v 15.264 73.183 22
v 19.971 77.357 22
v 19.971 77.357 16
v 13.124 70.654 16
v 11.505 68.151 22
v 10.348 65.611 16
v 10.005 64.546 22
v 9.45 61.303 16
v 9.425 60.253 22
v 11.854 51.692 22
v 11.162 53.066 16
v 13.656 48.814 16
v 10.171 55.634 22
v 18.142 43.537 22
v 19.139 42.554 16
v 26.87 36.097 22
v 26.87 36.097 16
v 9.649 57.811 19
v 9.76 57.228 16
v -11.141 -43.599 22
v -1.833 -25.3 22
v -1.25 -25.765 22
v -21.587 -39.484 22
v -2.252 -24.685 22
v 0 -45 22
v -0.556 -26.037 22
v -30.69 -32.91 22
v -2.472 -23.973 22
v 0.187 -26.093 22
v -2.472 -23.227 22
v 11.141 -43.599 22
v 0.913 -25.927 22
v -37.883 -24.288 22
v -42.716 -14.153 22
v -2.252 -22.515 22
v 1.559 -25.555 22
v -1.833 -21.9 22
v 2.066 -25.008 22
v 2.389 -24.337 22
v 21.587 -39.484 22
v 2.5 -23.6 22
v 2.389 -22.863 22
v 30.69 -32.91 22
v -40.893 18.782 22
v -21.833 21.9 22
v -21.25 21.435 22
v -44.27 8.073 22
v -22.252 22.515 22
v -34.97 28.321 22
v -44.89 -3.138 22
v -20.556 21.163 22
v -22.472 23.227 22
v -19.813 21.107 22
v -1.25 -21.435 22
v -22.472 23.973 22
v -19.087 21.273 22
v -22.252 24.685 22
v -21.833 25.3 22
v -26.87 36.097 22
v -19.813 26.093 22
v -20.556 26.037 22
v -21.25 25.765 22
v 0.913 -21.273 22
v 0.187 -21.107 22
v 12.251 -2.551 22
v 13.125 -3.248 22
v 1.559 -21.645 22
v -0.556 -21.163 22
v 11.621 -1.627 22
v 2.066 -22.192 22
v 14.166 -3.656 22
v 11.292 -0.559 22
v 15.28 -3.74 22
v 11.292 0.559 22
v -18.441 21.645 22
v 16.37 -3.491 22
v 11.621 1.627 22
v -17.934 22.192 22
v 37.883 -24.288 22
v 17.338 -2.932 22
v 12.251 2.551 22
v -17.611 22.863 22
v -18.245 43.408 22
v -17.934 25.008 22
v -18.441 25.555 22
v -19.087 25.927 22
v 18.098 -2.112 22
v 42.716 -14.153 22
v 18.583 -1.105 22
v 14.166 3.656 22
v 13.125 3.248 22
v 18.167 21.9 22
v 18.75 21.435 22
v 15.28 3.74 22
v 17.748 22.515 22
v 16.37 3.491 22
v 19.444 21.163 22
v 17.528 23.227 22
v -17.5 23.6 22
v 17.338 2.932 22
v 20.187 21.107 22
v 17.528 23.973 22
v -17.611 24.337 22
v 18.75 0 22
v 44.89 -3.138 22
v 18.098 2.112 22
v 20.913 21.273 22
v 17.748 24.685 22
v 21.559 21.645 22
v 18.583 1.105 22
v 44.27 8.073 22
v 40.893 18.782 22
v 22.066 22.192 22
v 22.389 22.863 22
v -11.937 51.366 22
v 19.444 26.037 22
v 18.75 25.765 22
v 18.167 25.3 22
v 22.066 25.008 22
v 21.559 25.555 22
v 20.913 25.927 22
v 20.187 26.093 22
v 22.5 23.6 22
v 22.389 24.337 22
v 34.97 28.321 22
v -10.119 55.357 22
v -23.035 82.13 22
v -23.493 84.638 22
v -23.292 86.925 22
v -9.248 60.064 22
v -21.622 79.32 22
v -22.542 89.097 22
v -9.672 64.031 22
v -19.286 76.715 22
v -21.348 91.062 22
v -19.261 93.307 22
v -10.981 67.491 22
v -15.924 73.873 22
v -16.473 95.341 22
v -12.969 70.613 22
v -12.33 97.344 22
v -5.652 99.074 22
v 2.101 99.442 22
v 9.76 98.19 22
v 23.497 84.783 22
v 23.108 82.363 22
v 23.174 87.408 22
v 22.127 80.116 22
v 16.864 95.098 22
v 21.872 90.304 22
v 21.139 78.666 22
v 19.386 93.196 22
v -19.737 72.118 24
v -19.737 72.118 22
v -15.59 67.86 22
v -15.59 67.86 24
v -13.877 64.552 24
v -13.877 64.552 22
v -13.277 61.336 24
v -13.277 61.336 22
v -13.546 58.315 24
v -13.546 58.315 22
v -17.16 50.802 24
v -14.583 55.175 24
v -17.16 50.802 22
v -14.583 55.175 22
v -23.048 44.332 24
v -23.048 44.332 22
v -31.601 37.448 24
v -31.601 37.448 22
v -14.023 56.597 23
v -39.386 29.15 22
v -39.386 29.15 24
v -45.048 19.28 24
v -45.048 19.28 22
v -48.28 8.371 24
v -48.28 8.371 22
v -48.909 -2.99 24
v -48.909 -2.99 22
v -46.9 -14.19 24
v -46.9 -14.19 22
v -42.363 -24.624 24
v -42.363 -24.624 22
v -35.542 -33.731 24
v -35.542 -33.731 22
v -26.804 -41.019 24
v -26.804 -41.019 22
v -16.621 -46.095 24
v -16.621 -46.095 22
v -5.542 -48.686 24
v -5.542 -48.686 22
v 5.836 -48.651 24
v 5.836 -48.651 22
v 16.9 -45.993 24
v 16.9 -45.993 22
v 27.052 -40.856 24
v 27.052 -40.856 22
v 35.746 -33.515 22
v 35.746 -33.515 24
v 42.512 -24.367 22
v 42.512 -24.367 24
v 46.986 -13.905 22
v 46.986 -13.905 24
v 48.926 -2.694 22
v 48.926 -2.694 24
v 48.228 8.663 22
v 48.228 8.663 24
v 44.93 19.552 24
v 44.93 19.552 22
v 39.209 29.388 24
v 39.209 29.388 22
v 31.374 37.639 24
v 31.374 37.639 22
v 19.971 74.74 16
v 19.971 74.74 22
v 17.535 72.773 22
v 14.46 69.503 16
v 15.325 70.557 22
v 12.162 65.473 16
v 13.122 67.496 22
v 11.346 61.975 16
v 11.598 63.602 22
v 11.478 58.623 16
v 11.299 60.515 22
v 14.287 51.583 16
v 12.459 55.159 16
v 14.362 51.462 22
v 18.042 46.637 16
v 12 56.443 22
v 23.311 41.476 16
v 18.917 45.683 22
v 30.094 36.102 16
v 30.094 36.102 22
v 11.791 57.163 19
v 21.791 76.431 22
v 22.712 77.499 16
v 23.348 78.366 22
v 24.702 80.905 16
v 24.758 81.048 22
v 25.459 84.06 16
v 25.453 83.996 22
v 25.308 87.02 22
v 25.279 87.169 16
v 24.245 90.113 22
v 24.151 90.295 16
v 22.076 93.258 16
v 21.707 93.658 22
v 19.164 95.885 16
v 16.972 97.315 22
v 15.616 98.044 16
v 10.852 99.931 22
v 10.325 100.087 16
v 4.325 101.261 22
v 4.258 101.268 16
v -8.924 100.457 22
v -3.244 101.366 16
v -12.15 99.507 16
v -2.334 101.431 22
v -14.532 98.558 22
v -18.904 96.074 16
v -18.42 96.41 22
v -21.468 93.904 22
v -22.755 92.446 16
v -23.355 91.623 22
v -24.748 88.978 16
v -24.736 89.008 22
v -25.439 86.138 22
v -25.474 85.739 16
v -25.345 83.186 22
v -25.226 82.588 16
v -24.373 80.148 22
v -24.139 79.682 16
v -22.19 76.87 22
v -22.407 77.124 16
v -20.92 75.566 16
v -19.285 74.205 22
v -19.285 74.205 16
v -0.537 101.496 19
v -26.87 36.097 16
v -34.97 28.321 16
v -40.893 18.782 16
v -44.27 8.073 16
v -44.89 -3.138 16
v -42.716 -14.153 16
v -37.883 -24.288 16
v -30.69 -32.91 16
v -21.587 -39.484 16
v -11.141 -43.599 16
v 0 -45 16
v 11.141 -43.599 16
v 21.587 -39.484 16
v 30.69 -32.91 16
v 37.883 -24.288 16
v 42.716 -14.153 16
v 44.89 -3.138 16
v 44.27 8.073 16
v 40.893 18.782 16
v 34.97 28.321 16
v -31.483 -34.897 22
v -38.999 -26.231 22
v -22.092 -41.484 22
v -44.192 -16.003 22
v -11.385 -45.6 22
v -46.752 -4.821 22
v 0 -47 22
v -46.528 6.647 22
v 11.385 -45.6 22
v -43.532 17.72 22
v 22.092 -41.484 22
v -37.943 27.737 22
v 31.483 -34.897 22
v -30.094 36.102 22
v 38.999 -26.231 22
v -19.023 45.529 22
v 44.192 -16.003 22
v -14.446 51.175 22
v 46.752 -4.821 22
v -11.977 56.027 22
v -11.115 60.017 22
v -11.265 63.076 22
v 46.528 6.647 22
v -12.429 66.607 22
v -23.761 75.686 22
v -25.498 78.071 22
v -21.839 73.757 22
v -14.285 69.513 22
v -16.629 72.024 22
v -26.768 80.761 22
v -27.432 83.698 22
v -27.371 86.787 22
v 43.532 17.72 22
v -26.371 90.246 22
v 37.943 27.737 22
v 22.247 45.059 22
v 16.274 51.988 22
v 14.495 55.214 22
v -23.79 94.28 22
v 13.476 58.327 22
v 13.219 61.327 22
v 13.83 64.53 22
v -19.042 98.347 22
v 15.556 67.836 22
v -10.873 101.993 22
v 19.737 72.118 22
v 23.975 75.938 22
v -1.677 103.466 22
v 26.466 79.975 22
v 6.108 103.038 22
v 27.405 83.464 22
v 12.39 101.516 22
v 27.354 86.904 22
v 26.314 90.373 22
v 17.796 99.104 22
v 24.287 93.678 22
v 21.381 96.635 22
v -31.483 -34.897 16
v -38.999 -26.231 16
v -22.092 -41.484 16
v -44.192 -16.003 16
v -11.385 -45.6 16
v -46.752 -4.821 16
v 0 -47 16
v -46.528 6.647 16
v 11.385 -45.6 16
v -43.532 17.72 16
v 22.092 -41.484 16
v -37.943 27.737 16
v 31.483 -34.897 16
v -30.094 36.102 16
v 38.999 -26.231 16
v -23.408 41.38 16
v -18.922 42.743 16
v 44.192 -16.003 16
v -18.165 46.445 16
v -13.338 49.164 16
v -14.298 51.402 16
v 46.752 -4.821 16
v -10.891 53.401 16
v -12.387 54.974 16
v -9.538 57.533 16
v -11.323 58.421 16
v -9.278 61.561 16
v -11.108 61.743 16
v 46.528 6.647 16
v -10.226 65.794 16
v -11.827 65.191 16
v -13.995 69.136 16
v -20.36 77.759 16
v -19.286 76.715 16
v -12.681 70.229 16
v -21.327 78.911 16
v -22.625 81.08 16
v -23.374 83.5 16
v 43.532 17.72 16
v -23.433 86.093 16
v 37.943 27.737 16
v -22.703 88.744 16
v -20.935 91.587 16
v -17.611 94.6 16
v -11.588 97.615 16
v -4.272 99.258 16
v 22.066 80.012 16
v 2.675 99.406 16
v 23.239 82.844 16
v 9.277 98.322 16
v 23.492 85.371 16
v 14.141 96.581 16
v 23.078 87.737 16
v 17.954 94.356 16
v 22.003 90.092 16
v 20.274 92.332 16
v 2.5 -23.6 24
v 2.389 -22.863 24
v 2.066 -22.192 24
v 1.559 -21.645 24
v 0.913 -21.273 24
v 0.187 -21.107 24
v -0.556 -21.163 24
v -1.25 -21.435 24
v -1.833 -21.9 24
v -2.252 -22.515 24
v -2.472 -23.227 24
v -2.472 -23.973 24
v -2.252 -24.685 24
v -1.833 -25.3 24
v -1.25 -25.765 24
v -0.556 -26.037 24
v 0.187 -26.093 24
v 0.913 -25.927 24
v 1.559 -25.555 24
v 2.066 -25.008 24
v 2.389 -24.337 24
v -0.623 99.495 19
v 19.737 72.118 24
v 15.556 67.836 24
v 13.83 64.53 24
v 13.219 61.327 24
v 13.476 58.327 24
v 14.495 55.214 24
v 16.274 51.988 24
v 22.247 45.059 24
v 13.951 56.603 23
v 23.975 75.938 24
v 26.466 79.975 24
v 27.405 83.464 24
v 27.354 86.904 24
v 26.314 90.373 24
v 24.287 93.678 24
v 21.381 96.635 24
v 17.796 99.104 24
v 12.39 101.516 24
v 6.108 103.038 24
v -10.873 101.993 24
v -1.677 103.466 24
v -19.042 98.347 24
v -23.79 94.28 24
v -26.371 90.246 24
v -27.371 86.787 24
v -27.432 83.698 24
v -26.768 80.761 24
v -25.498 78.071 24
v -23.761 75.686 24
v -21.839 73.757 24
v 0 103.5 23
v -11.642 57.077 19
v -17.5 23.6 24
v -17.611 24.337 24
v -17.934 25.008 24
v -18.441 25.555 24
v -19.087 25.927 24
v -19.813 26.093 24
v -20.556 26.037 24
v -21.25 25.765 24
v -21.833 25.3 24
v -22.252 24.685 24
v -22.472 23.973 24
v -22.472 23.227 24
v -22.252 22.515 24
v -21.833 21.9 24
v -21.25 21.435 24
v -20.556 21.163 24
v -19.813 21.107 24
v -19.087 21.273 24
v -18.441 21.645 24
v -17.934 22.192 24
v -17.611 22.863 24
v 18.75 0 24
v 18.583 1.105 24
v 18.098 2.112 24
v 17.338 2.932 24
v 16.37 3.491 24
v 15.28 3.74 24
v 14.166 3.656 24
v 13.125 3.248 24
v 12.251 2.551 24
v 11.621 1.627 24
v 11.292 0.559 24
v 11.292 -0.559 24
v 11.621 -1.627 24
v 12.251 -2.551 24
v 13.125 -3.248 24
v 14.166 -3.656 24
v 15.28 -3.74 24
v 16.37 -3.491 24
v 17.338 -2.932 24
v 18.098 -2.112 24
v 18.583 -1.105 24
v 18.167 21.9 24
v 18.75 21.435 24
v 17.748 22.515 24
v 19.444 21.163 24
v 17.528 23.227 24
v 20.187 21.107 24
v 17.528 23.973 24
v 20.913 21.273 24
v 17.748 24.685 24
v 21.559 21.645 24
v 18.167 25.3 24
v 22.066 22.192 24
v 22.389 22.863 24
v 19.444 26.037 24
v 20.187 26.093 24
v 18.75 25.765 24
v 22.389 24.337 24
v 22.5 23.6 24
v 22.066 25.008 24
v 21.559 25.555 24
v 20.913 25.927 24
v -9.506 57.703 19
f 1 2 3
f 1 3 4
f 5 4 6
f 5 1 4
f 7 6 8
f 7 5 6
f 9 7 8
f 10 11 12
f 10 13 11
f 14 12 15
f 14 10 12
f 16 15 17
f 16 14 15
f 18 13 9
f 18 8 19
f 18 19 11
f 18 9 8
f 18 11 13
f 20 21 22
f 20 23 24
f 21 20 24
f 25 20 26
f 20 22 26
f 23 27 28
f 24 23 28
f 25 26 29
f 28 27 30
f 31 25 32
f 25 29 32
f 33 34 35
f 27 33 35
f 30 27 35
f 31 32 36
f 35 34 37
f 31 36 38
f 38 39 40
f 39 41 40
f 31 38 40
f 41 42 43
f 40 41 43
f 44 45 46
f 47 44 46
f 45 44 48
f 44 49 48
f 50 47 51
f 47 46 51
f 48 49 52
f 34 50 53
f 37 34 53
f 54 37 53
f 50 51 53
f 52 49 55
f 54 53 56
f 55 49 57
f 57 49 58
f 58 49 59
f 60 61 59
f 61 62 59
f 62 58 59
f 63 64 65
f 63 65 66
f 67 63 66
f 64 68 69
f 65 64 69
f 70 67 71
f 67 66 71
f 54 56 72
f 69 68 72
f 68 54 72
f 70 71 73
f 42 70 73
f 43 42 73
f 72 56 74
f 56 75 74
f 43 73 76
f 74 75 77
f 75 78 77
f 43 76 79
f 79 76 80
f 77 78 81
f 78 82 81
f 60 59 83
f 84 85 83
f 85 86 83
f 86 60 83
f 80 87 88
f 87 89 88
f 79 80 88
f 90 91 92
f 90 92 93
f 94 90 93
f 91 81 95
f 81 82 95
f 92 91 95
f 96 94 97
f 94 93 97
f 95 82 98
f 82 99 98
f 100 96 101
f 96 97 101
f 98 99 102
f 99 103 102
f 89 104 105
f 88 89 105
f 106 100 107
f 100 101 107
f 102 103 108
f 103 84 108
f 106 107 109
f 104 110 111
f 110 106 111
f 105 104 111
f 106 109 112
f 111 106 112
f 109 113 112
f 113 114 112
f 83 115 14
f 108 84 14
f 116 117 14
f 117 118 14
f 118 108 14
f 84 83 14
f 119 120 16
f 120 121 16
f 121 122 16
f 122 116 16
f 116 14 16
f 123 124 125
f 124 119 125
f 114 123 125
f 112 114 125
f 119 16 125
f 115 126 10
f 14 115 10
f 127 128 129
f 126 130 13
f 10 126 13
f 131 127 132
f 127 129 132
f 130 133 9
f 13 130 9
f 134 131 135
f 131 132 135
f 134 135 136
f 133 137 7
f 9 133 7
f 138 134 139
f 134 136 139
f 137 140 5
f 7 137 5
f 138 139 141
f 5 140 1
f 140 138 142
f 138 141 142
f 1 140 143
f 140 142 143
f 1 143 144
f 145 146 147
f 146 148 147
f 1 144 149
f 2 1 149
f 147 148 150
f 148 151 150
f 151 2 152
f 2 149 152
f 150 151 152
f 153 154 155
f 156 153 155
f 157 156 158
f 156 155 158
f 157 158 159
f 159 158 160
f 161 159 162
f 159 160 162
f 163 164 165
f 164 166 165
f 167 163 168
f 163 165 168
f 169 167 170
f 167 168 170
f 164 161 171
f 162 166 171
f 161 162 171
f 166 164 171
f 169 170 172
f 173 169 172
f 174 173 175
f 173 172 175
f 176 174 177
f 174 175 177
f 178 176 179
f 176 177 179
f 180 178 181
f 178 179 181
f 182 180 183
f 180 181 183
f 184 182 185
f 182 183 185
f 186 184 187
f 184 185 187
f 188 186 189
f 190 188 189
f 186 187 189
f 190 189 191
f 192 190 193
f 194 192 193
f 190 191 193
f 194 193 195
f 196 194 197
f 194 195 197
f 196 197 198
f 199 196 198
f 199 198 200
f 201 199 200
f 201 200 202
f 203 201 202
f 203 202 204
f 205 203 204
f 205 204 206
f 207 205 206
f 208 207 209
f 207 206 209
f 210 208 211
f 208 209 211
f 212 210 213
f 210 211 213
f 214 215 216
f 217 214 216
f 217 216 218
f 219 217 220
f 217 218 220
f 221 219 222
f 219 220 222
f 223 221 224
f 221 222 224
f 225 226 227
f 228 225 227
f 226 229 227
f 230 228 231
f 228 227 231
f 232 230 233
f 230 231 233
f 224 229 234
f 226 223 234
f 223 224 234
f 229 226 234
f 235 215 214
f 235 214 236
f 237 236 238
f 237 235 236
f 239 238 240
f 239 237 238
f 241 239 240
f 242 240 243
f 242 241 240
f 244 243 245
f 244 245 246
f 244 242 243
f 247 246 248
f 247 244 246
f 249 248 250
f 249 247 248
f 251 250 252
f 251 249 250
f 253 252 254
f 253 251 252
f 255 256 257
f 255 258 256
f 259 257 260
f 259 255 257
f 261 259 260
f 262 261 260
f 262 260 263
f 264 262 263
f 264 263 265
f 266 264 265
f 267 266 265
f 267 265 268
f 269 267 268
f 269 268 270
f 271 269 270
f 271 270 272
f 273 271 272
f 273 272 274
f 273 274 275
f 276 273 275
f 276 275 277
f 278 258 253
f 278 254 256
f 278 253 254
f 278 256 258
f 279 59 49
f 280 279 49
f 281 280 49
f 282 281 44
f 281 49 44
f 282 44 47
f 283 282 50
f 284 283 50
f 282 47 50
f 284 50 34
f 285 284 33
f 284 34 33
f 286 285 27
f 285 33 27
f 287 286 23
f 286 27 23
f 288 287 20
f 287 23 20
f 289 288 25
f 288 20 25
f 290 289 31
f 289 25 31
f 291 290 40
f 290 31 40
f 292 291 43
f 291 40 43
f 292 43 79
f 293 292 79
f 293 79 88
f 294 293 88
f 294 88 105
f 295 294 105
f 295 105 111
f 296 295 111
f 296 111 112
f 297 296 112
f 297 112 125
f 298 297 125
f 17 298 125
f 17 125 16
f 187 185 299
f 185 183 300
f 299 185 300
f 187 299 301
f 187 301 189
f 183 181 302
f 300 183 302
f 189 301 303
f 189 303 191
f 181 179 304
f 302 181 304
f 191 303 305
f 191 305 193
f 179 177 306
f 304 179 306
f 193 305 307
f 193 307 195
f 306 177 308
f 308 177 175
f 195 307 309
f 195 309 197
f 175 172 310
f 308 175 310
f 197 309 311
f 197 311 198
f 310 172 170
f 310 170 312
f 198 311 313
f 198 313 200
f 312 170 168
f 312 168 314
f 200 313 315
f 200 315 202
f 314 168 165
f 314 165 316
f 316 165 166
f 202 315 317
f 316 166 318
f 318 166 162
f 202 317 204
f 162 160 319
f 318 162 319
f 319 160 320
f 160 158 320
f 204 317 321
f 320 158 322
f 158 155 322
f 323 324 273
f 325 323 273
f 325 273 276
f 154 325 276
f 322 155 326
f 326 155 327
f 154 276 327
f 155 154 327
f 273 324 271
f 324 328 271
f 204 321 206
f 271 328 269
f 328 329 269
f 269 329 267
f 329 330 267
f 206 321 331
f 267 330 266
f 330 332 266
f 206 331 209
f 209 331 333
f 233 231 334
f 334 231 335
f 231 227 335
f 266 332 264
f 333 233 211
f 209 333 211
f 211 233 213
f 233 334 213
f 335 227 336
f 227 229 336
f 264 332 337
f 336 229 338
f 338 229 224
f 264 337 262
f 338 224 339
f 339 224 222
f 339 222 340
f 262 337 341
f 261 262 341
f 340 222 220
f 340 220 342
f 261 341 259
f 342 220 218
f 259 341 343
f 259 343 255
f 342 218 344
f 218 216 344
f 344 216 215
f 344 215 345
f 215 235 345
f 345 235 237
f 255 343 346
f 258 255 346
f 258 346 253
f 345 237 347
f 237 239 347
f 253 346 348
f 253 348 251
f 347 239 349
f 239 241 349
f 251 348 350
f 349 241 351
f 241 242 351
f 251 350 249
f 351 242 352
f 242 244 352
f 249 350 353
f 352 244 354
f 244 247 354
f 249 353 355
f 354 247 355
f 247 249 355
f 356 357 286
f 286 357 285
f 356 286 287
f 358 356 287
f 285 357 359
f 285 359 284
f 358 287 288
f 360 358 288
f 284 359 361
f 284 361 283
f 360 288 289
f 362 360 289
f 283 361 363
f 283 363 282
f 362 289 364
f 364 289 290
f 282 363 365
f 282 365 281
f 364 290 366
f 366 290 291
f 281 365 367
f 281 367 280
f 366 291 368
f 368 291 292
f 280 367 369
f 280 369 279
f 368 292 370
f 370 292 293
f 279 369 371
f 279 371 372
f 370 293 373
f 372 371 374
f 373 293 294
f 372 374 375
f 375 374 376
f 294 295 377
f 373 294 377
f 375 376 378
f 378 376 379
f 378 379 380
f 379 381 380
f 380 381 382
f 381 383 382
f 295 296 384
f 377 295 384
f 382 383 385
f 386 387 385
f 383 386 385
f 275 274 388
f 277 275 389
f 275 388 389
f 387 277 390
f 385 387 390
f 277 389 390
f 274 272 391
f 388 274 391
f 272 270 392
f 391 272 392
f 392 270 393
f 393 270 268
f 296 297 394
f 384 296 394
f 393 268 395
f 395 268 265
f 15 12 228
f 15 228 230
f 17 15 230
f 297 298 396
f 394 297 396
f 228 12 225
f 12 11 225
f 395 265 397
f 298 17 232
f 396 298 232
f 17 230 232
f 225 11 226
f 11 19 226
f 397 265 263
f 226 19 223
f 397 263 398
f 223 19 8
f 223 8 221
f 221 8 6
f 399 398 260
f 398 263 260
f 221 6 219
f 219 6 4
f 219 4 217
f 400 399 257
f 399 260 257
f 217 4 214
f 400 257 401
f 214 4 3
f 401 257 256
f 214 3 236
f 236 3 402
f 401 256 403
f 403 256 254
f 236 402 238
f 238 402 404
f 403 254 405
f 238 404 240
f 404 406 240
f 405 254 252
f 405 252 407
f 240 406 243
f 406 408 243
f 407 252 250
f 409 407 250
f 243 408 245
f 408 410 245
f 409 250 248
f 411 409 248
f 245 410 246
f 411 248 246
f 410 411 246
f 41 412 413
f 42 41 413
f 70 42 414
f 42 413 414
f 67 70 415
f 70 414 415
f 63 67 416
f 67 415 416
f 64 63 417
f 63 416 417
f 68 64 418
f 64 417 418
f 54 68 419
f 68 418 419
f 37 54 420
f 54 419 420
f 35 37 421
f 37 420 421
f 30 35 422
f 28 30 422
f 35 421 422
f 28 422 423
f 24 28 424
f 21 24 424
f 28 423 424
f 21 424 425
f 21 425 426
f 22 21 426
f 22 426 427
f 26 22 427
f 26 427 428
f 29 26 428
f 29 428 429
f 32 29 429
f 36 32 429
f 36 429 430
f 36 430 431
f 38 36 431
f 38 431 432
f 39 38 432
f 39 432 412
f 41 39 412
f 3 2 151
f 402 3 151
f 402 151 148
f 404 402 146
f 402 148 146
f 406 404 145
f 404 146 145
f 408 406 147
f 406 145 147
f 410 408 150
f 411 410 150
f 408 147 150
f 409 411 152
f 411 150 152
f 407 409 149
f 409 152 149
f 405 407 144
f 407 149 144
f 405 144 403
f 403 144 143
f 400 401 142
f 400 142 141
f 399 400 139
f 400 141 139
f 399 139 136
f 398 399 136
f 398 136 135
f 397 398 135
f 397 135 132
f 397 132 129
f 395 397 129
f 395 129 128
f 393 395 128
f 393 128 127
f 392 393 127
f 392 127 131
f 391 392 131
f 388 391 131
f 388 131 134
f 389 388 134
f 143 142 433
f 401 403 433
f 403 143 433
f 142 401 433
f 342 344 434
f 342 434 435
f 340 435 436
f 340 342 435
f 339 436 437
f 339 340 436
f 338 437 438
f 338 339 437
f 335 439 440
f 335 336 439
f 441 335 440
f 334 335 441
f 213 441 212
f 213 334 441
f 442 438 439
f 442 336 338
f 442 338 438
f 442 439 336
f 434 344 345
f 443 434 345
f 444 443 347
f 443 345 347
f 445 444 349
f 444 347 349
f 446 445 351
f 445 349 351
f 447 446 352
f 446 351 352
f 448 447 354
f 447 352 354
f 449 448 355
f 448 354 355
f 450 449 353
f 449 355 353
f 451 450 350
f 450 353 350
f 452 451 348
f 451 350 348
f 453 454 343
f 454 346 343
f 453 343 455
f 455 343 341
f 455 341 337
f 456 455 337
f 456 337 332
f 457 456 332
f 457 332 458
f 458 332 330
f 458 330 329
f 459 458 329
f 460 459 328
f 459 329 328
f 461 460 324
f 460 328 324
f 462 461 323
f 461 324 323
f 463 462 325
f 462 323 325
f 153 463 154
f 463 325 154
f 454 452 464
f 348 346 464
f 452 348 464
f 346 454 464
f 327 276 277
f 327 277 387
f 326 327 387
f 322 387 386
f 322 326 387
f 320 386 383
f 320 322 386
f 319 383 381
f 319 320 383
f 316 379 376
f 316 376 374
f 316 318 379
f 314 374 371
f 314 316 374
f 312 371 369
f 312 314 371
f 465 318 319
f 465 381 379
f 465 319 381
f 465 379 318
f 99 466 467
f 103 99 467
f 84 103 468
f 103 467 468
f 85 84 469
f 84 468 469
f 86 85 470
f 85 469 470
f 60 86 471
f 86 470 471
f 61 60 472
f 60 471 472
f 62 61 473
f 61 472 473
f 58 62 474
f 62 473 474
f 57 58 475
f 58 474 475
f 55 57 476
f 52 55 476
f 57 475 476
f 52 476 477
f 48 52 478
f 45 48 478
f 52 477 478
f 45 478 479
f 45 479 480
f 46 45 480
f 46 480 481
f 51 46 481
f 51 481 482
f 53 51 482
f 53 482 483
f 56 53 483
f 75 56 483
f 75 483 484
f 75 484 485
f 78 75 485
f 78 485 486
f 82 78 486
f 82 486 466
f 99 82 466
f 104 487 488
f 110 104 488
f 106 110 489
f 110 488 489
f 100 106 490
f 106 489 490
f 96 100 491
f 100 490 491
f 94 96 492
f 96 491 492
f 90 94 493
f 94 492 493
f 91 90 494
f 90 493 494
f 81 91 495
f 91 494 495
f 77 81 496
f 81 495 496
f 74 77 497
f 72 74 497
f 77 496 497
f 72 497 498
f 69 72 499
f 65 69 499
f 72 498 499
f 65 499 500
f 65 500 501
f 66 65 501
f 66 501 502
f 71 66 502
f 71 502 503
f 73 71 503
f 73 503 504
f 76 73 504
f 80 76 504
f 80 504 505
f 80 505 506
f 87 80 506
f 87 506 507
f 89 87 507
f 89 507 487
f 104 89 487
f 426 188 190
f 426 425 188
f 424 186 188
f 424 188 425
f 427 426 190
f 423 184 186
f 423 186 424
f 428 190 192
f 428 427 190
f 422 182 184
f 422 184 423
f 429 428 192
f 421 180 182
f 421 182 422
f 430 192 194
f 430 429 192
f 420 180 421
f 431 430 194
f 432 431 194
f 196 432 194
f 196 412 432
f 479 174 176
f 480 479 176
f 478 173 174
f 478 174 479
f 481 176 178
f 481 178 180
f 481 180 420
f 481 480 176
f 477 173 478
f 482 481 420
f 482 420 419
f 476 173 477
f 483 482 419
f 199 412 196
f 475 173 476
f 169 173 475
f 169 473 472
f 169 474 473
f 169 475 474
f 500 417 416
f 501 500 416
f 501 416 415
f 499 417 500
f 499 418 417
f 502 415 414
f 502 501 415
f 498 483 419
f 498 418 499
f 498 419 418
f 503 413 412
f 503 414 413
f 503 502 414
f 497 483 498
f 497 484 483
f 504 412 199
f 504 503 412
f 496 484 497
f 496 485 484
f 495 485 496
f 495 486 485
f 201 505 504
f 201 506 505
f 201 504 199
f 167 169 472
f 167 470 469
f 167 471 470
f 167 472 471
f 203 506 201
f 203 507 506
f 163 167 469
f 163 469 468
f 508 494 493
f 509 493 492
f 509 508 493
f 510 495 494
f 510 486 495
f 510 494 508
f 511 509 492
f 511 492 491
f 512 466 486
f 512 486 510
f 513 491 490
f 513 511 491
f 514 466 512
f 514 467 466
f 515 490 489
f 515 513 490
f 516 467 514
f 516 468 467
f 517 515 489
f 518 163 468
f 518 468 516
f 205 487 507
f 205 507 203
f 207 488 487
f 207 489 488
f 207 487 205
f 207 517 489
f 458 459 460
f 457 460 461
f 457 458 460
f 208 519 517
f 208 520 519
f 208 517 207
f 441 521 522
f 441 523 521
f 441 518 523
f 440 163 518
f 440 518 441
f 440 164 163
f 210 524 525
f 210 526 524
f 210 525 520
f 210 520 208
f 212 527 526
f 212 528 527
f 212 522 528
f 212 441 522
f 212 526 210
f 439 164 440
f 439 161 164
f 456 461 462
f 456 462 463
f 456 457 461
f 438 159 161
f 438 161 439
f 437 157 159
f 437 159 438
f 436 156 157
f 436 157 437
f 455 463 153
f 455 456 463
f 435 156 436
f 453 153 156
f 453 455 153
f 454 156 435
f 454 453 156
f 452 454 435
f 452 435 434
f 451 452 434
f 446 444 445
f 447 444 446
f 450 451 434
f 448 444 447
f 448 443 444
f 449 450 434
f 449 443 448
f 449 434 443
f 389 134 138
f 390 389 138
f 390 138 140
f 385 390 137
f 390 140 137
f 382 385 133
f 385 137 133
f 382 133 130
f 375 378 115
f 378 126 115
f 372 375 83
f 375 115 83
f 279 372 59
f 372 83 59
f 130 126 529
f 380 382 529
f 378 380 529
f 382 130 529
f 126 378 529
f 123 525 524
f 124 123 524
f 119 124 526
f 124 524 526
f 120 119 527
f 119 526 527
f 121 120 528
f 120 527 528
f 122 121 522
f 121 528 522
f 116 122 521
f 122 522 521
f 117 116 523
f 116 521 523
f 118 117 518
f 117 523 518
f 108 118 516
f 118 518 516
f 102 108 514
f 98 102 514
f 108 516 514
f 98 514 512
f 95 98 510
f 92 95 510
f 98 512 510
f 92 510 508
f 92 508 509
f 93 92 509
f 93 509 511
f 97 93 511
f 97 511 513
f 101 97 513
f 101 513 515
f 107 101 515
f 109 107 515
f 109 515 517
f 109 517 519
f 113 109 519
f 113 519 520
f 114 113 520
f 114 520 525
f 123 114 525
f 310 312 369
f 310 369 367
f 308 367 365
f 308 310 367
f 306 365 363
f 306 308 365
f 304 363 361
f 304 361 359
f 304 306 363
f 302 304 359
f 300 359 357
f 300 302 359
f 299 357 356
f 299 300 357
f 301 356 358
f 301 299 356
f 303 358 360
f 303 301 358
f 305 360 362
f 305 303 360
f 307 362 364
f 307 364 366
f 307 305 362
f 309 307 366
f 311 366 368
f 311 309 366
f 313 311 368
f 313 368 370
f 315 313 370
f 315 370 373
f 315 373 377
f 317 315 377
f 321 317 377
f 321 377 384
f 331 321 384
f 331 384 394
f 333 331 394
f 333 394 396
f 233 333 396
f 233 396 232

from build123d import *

# Parameters (mm, degrees)
PAD006_DEPTH    = 2
PAD007_DEPTH    = 8
SKETCH016_R     = 2.5
SKETCH016_R_2   = 3.75
POCKET003_DEPTH = 8.001


with BuildPart() as part:
    # Sketch013 → Pad006 (new body)
    with BuildSketch(Plane.XY):
        with BuildLine():
            ThreePointArc((-31.601416, 37.447971), (0.14834, -48.999775), (31.374102, 37.63862))
            add(Edge.make_bspline(
                [(19.736906, 72.117588), (2.37782, 58.411312), (31.374102, 37.63862)],
                knots=[0, 0, 0, 1, 1, 1], degree=2, weights=[0.989264, 1, 1]))
            add(Edge.make_bspline(
                [(19.736906, 72.117588), (64.998138, 103.5), (0, 103.5), (-64.998138, 103.5), (-19.736906, 72.117588)],
                knots=[5.512891, 5.512891, 5.512891, 7.853982, 7.853982, 10.195072, 10.195072, 10.195072], degree=2, weights=[1, 0.389649, 1, 0.389649, 1]))
            add(Edge.make_bspline(
                [(-19.736906, 72.117588), (-2.37782, 58.411312), (-31.601416, 37.447971)],
                knots=[0, 0, 0, 1, 1, 1], degree=2))
        make_face()
    extrude(amount=PAD006_DEPTH)

    # Sketch017 → Pad007 (join)
    with BuildSketch(Plane.XY.offset(2)):
        with BuildLine():
            add(Edge.make_bspline(
                [(19.970939, 74.740258), (53.708474, 102.235842), (-0.537125, 101.496339), (-54.782724, 100.756837), (-19.285395, 74.205097)],
                knots=[5.612143, 5.612143, 5.612143, 7.875047, 7.875047, 10.137951, 10.137951, 10.137951], degree=2, weights=[1, 0.425346, 1, 0.425346, 1]))
            add(Edge.make_bspline(
                [(-19.285395, 74.205097), (1.40607, 59), (-30.093518, 36.102357)],
                knots=[0, 0, 0, 1, 1, 1], degree=2))
            ThreePointArc((-30.093518, 36.102357), (0, -47), (30.093518, 36.102357))
            add(Edge.make_bspline(
                [(19.970939, 74.740258), (-1.40607, 59), (30.093518, 36.102357)],
                knots=[0, 0, 0, 1, 1, 1], degree=2, weights=[0.989264, 1, 1]))
        make_face()
        with BuildLine():
            add(Edge.make_bspline(
                [(19.970651, 77.357323), (42.940421, 100.20824), (-0.62343, 99.494897), (-44.187281, 98.781553), (-19.285576, 76.714515)],
                knots=[5.728023, 5.728023, 5.728023, 7.880514, 7.880514, 10.033004, 10.033004, 10.033004], degree=2, weights=[1, 0.474637, 1, 0.474637, 1]))
            add(Edge.make_bspline(
                [(-19.285576, 76.714515), (4.066769, 59), (-26.870413, 36.096827)],
                knots=[0, 0, 0, 1, 1, 1], degree=2))
            ThreePointArc((-26.870413, 36.096827), (0, -45), (26.870413, 36.096827))
            add(Edge.make_bspline(
                [(19.970651, 77.357323), (-4.066769, 59), (26.870413, 36.096827)],
                knots=[0, 0, 0, 1, 1, 1], degree=2, weights=[0.989264, 1, 1]))
        make_face(mode=Mode.SUBTRACT)
    extrude(amount=-PAD007_DEPTH)

    # Sketch016 → Pocket003 (cut, through all)
    with BuildSketch(Plane.XY.offset(2)):
        with Locations((0, -23.6)):
            Circle(SKETCH016_R)
        with Locations((-20, 23.6)):
            Circle(SKETCH016_R)
        with Locations((20, 23.6)):
            Circle(SKETCH016_R)
        with Locations((15, 0)):
            Circle(SKETCH016_R_2)
    extrude(amount=-POCKET003_DEPTH, mode=Mode.SUBTRACT)


with BuildPart() as part_1:
    # Body003 placement: moved
    add(part.part.moved(Location((0, 0, 22))))


solid = part_1.part
